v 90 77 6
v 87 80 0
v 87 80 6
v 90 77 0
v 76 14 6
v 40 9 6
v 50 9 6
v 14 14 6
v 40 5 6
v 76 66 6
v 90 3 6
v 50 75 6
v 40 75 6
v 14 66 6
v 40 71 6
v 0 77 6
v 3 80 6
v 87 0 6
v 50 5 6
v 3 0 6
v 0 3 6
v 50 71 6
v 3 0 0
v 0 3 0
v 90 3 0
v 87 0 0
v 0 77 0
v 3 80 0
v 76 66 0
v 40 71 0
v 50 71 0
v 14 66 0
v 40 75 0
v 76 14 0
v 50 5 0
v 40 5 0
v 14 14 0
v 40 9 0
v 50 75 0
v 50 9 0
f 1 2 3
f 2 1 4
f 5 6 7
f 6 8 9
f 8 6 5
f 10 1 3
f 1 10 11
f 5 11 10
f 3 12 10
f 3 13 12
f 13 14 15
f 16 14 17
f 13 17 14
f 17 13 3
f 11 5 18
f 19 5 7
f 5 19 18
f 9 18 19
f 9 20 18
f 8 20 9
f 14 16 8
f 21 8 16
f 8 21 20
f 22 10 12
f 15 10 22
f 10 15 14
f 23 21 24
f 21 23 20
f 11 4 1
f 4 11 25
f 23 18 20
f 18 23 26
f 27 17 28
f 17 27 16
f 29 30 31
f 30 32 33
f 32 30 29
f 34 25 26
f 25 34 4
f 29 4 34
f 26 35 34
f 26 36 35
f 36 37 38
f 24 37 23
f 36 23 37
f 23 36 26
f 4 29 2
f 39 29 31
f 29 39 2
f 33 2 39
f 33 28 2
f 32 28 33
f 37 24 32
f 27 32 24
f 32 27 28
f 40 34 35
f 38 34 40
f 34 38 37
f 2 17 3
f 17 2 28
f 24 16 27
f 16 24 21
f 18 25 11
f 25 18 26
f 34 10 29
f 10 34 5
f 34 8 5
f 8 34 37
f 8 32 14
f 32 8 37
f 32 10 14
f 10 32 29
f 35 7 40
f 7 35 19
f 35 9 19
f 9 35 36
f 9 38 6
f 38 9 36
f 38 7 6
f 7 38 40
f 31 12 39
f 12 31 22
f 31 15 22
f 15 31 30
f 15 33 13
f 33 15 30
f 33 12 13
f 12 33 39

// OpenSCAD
$fn = 32;

// ----------------------------------------------------------------------
// Frame plate: 90 x 80 frame, 14 mm rails
// ----------------------------------------------------------------------

// --- parameters (mm) ---
plate_l = 90;             // plate length, X
plate_w = 80;             // plate width, Y
plate_t = 6;              // plate thickness, Z (extrusion height)
corner_c = 3;             // corner chamfer
frame_bar = 14;           // frame rail width
slot_l = 10;              // adjustment slot length
slot_w = 4;               // adjustment slot width

win_l = plate_l - 2 * frame_bar;  // window length
win_w = plate_w - 2 * frame_bar;  // window width

profile = [[3, 0], [87, 0], [90, 3], [90, 77], [87, 80], [3, 80], [0, 77], [0, 3]];  // primary outline, 8 points, counter clockwise
void_1 = [[14, 14], [76, 14], [76, 66], [14, 66]];  // the window, 4 points
void_2 = [[40, 5], [50, 5], [50, 9], [40, 9]];  // adjustment slot, 4 points
void_3 = [[40, 71], [50, 71], [50, 75], [40, 75]];  // adjustment slot, 4 points

// --- the one profile operation ---
difference() {
  linear_extrude(height = plate_t) polygon(points = profile);
  translate([0, 0, -1])
    linear_extrude(height = plate_t + 2) polygon(points = void_1);
  translate([0, 0, -1])
    linear_extrude(height = plate_t + 2) polygon(points = void_2);
  translate([0, 0, -1])
    linear_extrude(height = plate_t + 2) polygon(points = void_3);
}
